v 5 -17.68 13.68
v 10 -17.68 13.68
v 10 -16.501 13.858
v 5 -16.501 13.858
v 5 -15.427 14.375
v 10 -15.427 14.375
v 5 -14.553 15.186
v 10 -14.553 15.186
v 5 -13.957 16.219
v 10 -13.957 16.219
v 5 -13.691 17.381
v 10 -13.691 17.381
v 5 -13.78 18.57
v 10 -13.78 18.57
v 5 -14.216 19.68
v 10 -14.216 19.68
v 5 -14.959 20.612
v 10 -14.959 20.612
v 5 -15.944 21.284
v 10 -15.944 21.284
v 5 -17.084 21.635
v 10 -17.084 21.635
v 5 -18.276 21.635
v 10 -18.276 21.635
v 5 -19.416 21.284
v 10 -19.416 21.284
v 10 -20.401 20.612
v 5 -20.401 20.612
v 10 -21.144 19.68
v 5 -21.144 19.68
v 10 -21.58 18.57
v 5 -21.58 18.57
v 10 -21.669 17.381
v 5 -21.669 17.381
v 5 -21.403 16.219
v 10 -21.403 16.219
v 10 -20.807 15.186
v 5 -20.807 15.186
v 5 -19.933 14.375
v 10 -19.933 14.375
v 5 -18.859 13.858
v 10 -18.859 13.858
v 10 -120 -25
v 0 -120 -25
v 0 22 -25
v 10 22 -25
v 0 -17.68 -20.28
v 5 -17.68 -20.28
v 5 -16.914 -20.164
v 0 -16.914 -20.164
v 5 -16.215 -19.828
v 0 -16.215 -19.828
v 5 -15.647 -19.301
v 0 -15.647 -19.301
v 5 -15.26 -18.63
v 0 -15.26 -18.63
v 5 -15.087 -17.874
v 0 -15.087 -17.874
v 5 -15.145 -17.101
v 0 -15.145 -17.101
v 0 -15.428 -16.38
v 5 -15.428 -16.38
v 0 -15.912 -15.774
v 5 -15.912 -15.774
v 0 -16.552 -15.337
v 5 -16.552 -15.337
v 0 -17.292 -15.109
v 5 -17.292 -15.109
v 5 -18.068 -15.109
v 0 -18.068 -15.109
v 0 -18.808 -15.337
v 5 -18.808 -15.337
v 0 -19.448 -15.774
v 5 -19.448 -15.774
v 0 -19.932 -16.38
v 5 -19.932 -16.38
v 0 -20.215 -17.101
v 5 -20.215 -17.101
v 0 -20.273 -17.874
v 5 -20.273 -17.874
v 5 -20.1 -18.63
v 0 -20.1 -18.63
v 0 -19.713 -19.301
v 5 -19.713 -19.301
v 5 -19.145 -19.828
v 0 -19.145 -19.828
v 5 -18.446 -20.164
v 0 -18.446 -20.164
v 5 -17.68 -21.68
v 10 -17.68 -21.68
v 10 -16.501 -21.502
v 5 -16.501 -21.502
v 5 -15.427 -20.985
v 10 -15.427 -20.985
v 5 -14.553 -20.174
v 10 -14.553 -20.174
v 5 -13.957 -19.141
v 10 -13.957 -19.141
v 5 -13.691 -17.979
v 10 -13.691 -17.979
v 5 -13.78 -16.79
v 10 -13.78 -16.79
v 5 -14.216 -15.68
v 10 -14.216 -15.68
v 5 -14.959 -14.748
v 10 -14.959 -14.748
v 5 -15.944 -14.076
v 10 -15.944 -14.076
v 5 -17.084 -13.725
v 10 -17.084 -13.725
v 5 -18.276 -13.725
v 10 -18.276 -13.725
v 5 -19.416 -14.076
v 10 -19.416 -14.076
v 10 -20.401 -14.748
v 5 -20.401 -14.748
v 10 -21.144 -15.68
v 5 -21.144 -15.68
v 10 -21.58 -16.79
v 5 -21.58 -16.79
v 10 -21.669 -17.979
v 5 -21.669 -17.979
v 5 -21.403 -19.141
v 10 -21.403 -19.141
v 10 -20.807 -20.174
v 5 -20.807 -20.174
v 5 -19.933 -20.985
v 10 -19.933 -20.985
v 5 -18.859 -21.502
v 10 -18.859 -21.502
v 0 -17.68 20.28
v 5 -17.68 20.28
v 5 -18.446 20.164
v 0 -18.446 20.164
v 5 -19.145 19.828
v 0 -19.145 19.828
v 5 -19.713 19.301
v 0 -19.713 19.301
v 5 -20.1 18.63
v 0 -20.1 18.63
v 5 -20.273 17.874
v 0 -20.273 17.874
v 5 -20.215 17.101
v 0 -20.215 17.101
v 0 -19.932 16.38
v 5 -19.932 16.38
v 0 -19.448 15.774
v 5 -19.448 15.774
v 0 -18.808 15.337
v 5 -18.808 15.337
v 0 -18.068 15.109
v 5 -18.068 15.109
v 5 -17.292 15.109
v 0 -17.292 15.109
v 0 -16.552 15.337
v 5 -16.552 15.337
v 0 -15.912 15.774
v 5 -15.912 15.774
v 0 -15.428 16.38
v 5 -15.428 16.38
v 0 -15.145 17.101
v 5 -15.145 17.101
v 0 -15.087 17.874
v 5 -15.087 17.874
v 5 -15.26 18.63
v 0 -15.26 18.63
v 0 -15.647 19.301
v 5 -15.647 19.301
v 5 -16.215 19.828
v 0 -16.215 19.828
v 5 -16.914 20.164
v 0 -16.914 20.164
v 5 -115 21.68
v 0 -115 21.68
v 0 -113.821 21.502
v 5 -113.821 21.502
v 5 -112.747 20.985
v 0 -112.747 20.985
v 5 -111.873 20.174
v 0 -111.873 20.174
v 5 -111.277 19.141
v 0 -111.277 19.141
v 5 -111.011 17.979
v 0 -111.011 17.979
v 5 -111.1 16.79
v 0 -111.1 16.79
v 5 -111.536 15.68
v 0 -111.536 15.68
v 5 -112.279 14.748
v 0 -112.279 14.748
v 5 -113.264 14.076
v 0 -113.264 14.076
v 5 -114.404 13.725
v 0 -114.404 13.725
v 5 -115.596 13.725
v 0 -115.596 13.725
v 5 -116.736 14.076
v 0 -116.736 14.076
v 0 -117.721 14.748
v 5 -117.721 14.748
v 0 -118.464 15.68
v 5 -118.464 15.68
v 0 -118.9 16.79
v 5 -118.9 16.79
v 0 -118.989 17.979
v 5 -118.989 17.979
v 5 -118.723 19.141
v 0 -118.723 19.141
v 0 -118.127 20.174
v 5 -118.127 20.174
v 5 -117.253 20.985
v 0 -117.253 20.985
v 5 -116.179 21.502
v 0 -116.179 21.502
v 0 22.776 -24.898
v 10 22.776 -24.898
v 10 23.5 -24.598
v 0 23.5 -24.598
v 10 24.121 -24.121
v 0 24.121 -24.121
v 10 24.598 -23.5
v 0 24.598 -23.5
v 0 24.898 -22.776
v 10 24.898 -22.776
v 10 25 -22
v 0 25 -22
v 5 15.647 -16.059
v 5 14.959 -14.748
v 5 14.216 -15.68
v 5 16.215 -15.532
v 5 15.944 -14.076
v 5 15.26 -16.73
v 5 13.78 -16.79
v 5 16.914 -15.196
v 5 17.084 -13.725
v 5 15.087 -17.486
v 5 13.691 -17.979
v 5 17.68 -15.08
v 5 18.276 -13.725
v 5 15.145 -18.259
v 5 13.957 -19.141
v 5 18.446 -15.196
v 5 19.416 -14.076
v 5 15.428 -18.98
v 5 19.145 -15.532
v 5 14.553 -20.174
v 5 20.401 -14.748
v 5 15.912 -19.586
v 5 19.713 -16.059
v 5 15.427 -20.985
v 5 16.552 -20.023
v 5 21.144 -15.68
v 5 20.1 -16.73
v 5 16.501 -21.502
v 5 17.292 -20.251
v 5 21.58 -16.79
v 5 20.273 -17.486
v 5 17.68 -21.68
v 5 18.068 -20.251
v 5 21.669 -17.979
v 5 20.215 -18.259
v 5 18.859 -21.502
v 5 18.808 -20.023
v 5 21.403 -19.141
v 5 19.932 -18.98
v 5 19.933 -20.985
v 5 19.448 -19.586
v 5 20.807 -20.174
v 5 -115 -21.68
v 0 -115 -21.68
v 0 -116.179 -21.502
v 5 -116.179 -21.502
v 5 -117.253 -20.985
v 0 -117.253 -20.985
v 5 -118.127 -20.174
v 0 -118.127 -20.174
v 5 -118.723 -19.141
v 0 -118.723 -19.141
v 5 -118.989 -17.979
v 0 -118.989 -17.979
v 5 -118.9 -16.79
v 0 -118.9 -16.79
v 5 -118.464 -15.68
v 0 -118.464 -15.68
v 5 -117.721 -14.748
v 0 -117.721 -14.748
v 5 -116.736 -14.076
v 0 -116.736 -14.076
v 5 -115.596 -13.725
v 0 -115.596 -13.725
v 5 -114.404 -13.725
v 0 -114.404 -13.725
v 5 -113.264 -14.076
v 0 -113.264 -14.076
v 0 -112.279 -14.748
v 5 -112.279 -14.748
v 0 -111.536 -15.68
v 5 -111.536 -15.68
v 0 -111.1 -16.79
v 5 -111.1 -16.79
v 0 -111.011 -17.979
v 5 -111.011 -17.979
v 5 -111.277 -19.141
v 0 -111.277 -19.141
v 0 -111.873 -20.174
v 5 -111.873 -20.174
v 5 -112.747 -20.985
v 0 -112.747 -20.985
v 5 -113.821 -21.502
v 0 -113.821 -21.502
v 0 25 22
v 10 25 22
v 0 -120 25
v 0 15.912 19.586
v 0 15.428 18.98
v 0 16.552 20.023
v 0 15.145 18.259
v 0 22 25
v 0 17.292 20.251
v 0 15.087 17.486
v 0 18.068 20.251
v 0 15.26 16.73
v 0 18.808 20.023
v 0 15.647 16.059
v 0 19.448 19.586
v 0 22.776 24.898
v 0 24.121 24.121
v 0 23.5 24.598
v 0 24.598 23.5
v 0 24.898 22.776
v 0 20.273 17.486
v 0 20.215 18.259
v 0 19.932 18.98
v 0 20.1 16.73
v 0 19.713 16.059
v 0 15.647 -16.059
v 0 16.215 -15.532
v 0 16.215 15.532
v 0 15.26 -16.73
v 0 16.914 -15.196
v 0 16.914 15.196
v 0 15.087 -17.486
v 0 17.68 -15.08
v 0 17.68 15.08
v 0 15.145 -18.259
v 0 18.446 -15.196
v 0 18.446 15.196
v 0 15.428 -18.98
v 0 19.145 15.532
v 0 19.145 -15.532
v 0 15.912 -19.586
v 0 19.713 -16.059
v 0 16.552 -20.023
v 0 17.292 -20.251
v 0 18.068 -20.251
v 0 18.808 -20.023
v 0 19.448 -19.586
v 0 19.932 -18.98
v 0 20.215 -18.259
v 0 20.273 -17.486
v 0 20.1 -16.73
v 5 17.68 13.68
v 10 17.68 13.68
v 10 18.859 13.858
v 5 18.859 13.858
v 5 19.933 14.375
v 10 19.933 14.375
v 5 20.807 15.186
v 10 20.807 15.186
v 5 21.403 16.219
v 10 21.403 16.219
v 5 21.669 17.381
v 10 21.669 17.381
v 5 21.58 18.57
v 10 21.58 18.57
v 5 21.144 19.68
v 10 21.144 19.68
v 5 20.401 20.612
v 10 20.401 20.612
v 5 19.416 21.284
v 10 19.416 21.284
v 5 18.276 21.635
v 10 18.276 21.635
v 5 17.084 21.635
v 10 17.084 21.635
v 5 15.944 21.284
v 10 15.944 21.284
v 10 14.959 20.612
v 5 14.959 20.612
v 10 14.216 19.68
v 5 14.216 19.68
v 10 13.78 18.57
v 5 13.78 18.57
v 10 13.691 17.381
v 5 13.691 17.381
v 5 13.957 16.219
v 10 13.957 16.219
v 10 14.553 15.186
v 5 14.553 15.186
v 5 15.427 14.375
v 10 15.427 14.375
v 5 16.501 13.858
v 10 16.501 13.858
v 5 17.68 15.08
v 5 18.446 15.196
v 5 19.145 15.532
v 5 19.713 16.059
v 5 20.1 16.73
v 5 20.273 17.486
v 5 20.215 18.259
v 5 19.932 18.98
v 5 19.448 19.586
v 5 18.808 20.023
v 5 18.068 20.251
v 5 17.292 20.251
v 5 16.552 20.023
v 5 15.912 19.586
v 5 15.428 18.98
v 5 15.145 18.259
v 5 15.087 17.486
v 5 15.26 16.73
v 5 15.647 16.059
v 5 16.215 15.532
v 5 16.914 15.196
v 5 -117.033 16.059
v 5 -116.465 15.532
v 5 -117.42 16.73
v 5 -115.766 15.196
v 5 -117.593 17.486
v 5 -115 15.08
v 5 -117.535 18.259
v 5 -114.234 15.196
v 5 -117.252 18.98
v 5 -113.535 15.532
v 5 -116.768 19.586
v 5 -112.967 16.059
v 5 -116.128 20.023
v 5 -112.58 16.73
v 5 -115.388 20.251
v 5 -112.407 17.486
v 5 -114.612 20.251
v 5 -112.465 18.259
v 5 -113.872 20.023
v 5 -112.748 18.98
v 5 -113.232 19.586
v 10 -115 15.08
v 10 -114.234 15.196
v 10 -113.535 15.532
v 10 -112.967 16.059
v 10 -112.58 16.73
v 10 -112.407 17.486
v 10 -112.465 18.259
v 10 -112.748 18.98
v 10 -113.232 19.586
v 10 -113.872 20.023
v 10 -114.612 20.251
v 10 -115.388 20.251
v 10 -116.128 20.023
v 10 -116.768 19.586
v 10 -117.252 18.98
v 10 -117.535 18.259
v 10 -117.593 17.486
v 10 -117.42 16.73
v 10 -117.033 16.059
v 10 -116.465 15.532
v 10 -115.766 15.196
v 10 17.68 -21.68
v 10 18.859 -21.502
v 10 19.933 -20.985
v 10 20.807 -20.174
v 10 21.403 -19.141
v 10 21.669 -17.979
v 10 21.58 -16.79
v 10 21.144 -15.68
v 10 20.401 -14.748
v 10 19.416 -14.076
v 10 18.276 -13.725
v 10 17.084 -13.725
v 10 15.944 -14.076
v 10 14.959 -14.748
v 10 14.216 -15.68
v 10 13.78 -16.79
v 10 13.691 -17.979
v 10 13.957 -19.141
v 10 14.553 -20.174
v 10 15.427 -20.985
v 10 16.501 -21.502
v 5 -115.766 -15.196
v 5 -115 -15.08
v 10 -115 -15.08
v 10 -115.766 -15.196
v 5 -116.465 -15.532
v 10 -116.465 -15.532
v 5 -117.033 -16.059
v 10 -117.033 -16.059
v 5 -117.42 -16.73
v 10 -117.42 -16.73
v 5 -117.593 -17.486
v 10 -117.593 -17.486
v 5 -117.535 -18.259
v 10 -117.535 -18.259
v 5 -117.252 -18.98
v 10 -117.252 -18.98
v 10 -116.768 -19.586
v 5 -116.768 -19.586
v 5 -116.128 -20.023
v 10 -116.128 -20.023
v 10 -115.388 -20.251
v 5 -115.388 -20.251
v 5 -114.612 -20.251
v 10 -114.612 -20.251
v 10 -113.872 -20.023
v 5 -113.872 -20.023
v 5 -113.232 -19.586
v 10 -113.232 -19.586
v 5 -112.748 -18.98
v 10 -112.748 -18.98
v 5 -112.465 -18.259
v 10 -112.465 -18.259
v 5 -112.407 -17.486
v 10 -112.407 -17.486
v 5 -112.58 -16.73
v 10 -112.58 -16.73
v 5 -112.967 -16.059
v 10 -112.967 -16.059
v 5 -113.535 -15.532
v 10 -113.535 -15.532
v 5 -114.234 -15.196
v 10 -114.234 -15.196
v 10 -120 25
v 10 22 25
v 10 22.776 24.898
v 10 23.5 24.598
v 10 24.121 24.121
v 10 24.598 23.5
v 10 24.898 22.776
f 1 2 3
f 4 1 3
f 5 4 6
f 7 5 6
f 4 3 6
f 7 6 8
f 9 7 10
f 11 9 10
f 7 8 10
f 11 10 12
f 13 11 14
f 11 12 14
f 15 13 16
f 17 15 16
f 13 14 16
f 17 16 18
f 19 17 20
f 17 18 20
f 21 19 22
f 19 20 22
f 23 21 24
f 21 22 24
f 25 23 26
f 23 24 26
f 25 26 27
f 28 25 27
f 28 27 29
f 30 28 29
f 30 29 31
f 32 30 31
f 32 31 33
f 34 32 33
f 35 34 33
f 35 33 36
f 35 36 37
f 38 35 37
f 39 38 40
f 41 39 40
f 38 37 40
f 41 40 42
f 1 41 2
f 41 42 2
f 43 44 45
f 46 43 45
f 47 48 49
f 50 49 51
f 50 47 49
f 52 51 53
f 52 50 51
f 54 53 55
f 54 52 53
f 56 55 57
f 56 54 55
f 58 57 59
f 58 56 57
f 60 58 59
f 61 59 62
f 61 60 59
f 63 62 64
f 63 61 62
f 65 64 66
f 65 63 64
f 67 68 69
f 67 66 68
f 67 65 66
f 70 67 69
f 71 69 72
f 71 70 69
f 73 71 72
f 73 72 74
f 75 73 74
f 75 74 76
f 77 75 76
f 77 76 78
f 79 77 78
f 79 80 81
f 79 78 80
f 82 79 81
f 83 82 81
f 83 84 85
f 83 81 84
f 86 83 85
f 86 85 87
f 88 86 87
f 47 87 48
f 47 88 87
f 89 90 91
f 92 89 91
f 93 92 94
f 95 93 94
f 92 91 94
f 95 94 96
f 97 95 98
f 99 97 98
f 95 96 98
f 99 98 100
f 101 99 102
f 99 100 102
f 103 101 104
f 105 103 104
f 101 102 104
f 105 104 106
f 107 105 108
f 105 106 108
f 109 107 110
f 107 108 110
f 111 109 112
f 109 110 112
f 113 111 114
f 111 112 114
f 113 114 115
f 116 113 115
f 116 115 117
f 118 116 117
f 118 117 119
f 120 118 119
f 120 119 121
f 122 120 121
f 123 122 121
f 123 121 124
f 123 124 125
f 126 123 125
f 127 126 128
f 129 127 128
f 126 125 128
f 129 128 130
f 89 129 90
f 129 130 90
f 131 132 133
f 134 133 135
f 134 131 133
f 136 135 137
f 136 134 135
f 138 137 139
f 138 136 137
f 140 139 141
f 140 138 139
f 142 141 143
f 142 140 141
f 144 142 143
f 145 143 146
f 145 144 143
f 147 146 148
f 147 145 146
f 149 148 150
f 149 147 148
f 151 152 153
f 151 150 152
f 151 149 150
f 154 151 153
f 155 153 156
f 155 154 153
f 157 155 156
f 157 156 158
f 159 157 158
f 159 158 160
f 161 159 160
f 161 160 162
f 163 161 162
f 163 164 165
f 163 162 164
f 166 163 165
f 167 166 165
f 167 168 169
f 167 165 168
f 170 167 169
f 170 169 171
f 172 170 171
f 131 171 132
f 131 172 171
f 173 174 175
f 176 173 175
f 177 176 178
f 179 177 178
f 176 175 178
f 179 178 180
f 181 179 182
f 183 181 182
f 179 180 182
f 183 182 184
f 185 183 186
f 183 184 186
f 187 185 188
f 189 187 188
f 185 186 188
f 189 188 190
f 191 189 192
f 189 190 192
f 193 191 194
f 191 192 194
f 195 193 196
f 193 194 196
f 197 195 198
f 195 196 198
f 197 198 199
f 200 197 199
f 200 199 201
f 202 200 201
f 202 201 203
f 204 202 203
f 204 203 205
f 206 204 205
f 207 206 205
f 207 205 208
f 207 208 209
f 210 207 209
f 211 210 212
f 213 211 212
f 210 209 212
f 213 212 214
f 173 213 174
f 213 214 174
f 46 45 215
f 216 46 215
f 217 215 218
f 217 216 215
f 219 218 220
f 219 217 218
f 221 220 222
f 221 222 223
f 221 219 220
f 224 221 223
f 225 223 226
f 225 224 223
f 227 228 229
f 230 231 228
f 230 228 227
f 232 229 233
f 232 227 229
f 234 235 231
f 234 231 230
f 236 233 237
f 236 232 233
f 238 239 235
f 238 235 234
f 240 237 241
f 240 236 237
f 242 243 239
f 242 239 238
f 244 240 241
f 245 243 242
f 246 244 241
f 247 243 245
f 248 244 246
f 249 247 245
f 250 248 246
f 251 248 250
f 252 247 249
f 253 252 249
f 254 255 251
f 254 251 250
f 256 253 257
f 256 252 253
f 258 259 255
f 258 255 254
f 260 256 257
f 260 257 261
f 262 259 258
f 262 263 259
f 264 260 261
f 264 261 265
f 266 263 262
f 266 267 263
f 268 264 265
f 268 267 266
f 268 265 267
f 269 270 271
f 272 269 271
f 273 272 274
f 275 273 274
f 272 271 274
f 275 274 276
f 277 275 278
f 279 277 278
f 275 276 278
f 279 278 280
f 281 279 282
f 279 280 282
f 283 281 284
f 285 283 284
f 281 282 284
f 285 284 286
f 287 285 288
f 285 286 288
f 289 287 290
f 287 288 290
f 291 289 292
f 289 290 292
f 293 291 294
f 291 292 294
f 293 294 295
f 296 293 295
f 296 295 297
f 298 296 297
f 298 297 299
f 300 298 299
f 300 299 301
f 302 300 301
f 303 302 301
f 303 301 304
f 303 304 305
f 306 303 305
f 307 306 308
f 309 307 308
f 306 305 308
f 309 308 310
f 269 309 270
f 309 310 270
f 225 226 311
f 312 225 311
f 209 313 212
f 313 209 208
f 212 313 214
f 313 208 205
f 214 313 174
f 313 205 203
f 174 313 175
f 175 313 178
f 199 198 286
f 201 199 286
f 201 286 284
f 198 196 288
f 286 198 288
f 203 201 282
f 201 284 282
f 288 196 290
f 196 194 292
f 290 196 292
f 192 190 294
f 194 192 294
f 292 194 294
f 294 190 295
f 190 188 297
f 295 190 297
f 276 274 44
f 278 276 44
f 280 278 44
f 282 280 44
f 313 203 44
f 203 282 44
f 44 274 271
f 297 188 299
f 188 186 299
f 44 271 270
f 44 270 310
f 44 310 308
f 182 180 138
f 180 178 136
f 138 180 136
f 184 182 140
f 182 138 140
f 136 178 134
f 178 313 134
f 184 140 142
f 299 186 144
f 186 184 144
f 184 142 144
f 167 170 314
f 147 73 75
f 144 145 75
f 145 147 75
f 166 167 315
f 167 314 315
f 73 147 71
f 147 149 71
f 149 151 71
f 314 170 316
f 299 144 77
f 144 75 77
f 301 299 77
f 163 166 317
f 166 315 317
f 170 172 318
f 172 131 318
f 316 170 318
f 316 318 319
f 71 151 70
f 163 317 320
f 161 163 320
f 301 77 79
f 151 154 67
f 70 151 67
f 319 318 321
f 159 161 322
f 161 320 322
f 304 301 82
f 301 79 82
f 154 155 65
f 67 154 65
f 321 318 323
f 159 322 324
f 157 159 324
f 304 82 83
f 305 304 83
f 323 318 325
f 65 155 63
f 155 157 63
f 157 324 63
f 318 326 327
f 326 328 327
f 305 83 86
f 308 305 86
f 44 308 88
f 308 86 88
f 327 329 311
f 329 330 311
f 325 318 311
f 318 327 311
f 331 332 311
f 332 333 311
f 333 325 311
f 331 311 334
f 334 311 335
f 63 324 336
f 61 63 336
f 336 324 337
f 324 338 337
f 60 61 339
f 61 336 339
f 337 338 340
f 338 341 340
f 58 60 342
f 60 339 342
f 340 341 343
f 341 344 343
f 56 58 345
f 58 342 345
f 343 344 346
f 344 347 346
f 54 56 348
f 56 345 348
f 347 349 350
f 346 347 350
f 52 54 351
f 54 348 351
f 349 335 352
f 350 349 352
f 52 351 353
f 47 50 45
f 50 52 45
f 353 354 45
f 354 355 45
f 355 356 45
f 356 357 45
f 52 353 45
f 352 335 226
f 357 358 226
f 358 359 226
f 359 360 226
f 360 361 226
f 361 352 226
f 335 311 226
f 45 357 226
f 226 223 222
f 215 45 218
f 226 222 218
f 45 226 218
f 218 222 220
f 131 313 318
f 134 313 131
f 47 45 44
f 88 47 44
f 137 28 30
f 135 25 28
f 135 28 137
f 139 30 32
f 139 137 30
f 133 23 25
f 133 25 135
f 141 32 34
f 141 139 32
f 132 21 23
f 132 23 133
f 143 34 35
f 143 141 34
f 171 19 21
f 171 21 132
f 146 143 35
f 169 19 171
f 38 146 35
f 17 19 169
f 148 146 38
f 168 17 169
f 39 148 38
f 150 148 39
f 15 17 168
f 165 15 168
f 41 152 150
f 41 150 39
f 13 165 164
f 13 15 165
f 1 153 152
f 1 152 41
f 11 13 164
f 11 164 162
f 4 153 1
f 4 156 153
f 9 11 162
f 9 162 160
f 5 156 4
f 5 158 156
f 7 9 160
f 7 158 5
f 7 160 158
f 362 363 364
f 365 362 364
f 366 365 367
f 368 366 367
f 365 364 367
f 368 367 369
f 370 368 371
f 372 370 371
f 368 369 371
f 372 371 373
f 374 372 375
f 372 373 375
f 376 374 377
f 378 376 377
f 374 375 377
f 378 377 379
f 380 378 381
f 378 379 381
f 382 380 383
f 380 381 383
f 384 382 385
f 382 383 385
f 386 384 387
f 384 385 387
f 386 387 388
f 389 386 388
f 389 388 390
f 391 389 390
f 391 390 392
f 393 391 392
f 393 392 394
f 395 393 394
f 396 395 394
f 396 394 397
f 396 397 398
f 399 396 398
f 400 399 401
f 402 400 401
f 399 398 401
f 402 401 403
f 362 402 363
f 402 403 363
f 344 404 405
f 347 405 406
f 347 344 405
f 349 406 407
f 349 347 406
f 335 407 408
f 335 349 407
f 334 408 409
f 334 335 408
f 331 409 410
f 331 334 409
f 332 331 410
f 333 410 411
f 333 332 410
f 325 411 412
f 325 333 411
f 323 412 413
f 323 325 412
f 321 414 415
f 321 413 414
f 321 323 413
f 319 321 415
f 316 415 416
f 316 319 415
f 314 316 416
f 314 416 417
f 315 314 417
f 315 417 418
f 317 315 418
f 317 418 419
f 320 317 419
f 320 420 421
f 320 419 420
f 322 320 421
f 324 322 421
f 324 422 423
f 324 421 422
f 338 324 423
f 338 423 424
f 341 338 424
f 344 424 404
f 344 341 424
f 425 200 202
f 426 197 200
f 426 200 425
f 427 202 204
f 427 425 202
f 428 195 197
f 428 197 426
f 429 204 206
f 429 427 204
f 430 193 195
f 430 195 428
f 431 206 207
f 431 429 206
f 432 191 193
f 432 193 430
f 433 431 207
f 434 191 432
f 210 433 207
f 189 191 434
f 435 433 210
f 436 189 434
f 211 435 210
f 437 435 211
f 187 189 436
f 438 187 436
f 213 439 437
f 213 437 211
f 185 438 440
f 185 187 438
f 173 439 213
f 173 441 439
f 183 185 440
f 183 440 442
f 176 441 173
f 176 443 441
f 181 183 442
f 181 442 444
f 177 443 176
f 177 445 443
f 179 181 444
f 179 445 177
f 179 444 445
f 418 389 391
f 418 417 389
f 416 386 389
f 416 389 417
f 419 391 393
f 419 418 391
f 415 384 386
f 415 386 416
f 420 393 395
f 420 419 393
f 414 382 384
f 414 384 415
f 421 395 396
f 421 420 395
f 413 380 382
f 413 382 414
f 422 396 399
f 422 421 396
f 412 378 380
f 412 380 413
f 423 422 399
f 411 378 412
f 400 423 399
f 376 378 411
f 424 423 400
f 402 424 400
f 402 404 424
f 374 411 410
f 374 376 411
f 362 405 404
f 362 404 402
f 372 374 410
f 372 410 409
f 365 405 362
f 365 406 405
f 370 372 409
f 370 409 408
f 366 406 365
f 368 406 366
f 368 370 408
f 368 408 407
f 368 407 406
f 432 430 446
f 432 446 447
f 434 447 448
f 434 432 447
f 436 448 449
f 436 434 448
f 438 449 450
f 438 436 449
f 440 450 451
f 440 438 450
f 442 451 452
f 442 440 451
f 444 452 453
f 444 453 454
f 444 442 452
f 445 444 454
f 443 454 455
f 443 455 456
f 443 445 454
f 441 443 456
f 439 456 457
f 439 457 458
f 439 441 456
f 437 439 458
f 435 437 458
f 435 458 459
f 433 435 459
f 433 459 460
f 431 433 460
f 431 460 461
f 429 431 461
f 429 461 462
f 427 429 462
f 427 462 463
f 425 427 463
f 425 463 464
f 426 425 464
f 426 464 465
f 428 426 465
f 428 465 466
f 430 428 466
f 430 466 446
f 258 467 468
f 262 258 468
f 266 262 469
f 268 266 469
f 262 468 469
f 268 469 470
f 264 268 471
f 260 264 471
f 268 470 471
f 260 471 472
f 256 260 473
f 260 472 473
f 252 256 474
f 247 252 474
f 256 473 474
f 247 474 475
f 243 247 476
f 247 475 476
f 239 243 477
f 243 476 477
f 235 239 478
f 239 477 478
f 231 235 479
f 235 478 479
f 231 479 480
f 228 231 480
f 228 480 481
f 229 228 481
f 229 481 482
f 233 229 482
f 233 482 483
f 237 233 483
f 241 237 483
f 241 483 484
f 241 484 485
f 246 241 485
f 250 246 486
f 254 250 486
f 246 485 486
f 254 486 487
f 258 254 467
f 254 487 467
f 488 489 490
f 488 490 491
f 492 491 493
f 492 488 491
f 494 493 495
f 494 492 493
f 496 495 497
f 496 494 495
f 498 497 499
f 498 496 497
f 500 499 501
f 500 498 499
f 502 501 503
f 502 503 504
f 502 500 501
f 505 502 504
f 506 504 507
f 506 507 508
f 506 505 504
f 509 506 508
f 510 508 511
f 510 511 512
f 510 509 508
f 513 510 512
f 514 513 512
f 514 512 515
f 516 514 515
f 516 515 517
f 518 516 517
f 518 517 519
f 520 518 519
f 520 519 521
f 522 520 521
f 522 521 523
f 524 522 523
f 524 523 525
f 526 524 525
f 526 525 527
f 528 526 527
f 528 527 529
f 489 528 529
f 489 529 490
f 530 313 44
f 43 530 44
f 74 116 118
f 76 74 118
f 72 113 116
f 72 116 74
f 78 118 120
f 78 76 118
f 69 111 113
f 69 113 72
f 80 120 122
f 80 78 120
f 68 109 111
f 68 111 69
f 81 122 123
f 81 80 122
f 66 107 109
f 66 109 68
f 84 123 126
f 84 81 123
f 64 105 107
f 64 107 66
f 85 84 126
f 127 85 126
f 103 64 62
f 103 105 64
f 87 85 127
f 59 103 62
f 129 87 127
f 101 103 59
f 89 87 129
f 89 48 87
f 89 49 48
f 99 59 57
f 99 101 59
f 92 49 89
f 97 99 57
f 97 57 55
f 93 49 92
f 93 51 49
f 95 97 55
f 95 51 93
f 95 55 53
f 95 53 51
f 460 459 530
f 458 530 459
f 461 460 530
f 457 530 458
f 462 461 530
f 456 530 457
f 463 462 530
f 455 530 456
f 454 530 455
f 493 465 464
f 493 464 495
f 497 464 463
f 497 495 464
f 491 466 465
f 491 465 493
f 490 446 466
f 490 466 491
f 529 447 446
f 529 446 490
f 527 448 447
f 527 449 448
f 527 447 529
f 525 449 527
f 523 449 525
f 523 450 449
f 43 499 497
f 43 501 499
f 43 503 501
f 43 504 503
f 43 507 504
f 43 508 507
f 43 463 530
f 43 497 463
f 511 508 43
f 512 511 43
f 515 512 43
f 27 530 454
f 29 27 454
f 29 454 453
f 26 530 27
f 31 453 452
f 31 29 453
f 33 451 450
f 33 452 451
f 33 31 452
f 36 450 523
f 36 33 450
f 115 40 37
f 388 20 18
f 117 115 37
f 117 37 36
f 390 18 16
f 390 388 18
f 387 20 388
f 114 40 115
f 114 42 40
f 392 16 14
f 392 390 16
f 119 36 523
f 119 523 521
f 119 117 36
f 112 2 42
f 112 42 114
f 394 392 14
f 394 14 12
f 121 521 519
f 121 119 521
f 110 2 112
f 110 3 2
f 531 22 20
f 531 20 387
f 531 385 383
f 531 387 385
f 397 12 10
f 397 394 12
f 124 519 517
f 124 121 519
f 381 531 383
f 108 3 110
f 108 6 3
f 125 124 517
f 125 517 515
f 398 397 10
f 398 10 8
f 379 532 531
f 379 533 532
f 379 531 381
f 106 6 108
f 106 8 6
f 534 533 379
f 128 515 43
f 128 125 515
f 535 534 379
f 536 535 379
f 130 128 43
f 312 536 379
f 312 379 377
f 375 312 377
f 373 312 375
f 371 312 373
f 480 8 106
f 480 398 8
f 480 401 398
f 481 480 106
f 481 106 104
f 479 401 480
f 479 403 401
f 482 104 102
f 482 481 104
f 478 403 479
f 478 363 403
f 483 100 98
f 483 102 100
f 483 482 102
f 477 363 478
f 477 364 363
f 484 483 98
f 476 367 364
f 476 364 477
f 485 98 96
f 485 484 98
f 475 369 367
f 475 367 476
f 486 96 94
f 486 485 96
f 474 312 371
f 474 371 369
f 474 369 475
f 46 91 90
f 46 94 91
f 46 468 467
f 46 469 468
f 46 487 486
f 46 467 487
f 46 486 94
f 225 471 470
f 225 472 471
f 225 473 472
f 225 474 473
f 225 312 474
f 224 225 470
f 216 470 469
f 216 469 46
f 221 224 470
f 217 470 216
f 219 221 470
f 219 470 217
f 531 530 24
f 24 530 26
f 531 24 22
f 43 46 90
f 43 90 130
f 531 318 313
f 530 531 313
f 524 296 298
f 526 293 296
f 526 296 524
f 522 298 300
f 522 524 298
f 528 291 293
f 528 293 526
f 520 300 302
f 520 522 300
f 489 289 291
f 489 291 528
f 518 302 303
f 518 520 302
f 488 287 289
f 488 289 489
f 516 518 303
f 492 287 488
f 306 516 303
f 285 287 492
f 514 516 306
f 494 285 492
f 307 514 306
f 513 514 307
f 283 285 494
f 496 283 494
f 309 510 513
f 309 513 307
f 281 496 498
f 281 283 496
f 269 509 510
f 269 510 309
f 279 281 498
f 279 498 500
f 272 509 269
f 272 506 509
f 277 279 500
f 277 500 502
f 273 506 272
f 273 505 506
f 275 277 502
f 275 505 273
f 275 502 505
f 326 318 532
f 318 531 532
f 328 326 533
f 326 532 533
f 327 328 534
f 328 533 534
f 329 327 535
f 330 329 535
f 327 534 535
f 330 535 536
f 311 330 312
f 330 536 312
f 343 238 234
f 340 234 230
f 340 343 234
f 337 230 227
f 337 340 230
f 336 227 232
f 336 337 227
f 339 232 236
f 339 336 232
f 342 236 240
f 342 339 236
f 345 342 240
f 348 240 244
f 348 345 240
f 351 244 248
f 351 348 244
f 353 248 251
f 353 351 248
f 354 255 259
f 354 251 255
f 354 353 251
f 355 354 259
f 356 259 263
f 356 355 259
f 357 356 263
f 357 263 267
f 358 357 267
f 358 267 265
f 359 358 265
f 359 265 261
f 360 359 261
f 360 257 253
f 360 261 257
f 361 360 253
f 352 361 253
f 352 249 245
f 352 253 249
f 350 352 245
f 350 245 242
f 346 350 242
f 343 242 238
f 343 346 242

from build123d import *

# Parameters (mm, degrees)
CROQUIS1_R              = 2.6
SALIENTE_EXTRUIR1_DEPTH = 10
CROQUIS5_R              = 4
CORTAR_EXTRUIR2_DEPTH   = 5
FILLET1_R               = 3
SKETCH1_R               = 4
CUT_EXTRUDE1_DEPTH      = 5


with BuildPart() as part:
    # Croquis1 → Saliente-Extruir1 (new body)
    with BuildSketch(Plane(origin=(0, 0, 0), x_dir=(0, 0, -1), z_dir=(1, 0, 0))):
        Polygon((-25, -120), (25, -120), (25, 25), (0, 25), (-25, 25), (-25, 0), align=None)
        with Locations((-17.68, 17.68)):
            Circle(CROQUIS1_R, mode=Mode.SUBTRACT)
        with Locations(Location((17.68, 17.68, 0), (0, 0, 180))):
            Circle(CROQUIS1_R, mode=Mode.SUBTRACT)
        with Locations((17.68, -17.68)):
            Circle(CROQUIS1_R, mode=Mode.SUBTRACT)
        with Locations(Location((-17.68, -17.68, 0), (0, 0, 180))):
            Circle(CROQUIS1_R, mode=Mode.SUBTRACT)
        with Locations((-17.68, -115)):
            Circle(CROQUIS1_R, mode=Mode.SUBTRACT)
        with Locations(Location((17.68, -115, 0), (0, 0, 180))):
            Circle(CROQUIS1_R, mode=Mode.SUBTRACT)
    extrude(amount=SALIENTE_EXTRUIR1_DEPTH)

    # Croquis5 → Cortar-Extruir2 (cut)
    with BuildSketch(Plane(origin=(10, 0, 0), x_dir=(0, 0, -1), z_dir=(1, 0, 0))):
        with Locations((17.68, 17.68)):
            Circle(CROQUIS5_R)
        with Locations((-17.68, 17.68)):
            Circle(CROQUIS5_R)
        with Locations((-17.68, -17.68)):
            Circle(CROQUIS5_R)
        with Locations((17.68, -17.68)):
            Circle(CROQUIS5_R)
    extrude(amount=-CORTAR_EXTRUIR2_DEPTH, mode=Mode.SUBTRACT)

    # Fillet1
    fillet1_edges = [part.edges().sort_by_distance(p)[0] for p in [
        (5, 25, -25),
        (5, 25, 25),
    ]]
    fillet(fillet1_edges, radius=FILLET1_R)

    # Sketch1 → Cut-Extrude1 (cut)
    with BuildSketch(Plane.ZY):
        with Locations((17.68, -115)):
            Circle(SKETCH1_R)
        with Locations(Location((-17.68, -115, 0), (0, 0, 180))):
            Circle(SKETCH1_R)
    extrude(amount=-CUT_EXTRUDE1_DEPTH, mode=Mode.SUBTRACT)


solid = part.part
